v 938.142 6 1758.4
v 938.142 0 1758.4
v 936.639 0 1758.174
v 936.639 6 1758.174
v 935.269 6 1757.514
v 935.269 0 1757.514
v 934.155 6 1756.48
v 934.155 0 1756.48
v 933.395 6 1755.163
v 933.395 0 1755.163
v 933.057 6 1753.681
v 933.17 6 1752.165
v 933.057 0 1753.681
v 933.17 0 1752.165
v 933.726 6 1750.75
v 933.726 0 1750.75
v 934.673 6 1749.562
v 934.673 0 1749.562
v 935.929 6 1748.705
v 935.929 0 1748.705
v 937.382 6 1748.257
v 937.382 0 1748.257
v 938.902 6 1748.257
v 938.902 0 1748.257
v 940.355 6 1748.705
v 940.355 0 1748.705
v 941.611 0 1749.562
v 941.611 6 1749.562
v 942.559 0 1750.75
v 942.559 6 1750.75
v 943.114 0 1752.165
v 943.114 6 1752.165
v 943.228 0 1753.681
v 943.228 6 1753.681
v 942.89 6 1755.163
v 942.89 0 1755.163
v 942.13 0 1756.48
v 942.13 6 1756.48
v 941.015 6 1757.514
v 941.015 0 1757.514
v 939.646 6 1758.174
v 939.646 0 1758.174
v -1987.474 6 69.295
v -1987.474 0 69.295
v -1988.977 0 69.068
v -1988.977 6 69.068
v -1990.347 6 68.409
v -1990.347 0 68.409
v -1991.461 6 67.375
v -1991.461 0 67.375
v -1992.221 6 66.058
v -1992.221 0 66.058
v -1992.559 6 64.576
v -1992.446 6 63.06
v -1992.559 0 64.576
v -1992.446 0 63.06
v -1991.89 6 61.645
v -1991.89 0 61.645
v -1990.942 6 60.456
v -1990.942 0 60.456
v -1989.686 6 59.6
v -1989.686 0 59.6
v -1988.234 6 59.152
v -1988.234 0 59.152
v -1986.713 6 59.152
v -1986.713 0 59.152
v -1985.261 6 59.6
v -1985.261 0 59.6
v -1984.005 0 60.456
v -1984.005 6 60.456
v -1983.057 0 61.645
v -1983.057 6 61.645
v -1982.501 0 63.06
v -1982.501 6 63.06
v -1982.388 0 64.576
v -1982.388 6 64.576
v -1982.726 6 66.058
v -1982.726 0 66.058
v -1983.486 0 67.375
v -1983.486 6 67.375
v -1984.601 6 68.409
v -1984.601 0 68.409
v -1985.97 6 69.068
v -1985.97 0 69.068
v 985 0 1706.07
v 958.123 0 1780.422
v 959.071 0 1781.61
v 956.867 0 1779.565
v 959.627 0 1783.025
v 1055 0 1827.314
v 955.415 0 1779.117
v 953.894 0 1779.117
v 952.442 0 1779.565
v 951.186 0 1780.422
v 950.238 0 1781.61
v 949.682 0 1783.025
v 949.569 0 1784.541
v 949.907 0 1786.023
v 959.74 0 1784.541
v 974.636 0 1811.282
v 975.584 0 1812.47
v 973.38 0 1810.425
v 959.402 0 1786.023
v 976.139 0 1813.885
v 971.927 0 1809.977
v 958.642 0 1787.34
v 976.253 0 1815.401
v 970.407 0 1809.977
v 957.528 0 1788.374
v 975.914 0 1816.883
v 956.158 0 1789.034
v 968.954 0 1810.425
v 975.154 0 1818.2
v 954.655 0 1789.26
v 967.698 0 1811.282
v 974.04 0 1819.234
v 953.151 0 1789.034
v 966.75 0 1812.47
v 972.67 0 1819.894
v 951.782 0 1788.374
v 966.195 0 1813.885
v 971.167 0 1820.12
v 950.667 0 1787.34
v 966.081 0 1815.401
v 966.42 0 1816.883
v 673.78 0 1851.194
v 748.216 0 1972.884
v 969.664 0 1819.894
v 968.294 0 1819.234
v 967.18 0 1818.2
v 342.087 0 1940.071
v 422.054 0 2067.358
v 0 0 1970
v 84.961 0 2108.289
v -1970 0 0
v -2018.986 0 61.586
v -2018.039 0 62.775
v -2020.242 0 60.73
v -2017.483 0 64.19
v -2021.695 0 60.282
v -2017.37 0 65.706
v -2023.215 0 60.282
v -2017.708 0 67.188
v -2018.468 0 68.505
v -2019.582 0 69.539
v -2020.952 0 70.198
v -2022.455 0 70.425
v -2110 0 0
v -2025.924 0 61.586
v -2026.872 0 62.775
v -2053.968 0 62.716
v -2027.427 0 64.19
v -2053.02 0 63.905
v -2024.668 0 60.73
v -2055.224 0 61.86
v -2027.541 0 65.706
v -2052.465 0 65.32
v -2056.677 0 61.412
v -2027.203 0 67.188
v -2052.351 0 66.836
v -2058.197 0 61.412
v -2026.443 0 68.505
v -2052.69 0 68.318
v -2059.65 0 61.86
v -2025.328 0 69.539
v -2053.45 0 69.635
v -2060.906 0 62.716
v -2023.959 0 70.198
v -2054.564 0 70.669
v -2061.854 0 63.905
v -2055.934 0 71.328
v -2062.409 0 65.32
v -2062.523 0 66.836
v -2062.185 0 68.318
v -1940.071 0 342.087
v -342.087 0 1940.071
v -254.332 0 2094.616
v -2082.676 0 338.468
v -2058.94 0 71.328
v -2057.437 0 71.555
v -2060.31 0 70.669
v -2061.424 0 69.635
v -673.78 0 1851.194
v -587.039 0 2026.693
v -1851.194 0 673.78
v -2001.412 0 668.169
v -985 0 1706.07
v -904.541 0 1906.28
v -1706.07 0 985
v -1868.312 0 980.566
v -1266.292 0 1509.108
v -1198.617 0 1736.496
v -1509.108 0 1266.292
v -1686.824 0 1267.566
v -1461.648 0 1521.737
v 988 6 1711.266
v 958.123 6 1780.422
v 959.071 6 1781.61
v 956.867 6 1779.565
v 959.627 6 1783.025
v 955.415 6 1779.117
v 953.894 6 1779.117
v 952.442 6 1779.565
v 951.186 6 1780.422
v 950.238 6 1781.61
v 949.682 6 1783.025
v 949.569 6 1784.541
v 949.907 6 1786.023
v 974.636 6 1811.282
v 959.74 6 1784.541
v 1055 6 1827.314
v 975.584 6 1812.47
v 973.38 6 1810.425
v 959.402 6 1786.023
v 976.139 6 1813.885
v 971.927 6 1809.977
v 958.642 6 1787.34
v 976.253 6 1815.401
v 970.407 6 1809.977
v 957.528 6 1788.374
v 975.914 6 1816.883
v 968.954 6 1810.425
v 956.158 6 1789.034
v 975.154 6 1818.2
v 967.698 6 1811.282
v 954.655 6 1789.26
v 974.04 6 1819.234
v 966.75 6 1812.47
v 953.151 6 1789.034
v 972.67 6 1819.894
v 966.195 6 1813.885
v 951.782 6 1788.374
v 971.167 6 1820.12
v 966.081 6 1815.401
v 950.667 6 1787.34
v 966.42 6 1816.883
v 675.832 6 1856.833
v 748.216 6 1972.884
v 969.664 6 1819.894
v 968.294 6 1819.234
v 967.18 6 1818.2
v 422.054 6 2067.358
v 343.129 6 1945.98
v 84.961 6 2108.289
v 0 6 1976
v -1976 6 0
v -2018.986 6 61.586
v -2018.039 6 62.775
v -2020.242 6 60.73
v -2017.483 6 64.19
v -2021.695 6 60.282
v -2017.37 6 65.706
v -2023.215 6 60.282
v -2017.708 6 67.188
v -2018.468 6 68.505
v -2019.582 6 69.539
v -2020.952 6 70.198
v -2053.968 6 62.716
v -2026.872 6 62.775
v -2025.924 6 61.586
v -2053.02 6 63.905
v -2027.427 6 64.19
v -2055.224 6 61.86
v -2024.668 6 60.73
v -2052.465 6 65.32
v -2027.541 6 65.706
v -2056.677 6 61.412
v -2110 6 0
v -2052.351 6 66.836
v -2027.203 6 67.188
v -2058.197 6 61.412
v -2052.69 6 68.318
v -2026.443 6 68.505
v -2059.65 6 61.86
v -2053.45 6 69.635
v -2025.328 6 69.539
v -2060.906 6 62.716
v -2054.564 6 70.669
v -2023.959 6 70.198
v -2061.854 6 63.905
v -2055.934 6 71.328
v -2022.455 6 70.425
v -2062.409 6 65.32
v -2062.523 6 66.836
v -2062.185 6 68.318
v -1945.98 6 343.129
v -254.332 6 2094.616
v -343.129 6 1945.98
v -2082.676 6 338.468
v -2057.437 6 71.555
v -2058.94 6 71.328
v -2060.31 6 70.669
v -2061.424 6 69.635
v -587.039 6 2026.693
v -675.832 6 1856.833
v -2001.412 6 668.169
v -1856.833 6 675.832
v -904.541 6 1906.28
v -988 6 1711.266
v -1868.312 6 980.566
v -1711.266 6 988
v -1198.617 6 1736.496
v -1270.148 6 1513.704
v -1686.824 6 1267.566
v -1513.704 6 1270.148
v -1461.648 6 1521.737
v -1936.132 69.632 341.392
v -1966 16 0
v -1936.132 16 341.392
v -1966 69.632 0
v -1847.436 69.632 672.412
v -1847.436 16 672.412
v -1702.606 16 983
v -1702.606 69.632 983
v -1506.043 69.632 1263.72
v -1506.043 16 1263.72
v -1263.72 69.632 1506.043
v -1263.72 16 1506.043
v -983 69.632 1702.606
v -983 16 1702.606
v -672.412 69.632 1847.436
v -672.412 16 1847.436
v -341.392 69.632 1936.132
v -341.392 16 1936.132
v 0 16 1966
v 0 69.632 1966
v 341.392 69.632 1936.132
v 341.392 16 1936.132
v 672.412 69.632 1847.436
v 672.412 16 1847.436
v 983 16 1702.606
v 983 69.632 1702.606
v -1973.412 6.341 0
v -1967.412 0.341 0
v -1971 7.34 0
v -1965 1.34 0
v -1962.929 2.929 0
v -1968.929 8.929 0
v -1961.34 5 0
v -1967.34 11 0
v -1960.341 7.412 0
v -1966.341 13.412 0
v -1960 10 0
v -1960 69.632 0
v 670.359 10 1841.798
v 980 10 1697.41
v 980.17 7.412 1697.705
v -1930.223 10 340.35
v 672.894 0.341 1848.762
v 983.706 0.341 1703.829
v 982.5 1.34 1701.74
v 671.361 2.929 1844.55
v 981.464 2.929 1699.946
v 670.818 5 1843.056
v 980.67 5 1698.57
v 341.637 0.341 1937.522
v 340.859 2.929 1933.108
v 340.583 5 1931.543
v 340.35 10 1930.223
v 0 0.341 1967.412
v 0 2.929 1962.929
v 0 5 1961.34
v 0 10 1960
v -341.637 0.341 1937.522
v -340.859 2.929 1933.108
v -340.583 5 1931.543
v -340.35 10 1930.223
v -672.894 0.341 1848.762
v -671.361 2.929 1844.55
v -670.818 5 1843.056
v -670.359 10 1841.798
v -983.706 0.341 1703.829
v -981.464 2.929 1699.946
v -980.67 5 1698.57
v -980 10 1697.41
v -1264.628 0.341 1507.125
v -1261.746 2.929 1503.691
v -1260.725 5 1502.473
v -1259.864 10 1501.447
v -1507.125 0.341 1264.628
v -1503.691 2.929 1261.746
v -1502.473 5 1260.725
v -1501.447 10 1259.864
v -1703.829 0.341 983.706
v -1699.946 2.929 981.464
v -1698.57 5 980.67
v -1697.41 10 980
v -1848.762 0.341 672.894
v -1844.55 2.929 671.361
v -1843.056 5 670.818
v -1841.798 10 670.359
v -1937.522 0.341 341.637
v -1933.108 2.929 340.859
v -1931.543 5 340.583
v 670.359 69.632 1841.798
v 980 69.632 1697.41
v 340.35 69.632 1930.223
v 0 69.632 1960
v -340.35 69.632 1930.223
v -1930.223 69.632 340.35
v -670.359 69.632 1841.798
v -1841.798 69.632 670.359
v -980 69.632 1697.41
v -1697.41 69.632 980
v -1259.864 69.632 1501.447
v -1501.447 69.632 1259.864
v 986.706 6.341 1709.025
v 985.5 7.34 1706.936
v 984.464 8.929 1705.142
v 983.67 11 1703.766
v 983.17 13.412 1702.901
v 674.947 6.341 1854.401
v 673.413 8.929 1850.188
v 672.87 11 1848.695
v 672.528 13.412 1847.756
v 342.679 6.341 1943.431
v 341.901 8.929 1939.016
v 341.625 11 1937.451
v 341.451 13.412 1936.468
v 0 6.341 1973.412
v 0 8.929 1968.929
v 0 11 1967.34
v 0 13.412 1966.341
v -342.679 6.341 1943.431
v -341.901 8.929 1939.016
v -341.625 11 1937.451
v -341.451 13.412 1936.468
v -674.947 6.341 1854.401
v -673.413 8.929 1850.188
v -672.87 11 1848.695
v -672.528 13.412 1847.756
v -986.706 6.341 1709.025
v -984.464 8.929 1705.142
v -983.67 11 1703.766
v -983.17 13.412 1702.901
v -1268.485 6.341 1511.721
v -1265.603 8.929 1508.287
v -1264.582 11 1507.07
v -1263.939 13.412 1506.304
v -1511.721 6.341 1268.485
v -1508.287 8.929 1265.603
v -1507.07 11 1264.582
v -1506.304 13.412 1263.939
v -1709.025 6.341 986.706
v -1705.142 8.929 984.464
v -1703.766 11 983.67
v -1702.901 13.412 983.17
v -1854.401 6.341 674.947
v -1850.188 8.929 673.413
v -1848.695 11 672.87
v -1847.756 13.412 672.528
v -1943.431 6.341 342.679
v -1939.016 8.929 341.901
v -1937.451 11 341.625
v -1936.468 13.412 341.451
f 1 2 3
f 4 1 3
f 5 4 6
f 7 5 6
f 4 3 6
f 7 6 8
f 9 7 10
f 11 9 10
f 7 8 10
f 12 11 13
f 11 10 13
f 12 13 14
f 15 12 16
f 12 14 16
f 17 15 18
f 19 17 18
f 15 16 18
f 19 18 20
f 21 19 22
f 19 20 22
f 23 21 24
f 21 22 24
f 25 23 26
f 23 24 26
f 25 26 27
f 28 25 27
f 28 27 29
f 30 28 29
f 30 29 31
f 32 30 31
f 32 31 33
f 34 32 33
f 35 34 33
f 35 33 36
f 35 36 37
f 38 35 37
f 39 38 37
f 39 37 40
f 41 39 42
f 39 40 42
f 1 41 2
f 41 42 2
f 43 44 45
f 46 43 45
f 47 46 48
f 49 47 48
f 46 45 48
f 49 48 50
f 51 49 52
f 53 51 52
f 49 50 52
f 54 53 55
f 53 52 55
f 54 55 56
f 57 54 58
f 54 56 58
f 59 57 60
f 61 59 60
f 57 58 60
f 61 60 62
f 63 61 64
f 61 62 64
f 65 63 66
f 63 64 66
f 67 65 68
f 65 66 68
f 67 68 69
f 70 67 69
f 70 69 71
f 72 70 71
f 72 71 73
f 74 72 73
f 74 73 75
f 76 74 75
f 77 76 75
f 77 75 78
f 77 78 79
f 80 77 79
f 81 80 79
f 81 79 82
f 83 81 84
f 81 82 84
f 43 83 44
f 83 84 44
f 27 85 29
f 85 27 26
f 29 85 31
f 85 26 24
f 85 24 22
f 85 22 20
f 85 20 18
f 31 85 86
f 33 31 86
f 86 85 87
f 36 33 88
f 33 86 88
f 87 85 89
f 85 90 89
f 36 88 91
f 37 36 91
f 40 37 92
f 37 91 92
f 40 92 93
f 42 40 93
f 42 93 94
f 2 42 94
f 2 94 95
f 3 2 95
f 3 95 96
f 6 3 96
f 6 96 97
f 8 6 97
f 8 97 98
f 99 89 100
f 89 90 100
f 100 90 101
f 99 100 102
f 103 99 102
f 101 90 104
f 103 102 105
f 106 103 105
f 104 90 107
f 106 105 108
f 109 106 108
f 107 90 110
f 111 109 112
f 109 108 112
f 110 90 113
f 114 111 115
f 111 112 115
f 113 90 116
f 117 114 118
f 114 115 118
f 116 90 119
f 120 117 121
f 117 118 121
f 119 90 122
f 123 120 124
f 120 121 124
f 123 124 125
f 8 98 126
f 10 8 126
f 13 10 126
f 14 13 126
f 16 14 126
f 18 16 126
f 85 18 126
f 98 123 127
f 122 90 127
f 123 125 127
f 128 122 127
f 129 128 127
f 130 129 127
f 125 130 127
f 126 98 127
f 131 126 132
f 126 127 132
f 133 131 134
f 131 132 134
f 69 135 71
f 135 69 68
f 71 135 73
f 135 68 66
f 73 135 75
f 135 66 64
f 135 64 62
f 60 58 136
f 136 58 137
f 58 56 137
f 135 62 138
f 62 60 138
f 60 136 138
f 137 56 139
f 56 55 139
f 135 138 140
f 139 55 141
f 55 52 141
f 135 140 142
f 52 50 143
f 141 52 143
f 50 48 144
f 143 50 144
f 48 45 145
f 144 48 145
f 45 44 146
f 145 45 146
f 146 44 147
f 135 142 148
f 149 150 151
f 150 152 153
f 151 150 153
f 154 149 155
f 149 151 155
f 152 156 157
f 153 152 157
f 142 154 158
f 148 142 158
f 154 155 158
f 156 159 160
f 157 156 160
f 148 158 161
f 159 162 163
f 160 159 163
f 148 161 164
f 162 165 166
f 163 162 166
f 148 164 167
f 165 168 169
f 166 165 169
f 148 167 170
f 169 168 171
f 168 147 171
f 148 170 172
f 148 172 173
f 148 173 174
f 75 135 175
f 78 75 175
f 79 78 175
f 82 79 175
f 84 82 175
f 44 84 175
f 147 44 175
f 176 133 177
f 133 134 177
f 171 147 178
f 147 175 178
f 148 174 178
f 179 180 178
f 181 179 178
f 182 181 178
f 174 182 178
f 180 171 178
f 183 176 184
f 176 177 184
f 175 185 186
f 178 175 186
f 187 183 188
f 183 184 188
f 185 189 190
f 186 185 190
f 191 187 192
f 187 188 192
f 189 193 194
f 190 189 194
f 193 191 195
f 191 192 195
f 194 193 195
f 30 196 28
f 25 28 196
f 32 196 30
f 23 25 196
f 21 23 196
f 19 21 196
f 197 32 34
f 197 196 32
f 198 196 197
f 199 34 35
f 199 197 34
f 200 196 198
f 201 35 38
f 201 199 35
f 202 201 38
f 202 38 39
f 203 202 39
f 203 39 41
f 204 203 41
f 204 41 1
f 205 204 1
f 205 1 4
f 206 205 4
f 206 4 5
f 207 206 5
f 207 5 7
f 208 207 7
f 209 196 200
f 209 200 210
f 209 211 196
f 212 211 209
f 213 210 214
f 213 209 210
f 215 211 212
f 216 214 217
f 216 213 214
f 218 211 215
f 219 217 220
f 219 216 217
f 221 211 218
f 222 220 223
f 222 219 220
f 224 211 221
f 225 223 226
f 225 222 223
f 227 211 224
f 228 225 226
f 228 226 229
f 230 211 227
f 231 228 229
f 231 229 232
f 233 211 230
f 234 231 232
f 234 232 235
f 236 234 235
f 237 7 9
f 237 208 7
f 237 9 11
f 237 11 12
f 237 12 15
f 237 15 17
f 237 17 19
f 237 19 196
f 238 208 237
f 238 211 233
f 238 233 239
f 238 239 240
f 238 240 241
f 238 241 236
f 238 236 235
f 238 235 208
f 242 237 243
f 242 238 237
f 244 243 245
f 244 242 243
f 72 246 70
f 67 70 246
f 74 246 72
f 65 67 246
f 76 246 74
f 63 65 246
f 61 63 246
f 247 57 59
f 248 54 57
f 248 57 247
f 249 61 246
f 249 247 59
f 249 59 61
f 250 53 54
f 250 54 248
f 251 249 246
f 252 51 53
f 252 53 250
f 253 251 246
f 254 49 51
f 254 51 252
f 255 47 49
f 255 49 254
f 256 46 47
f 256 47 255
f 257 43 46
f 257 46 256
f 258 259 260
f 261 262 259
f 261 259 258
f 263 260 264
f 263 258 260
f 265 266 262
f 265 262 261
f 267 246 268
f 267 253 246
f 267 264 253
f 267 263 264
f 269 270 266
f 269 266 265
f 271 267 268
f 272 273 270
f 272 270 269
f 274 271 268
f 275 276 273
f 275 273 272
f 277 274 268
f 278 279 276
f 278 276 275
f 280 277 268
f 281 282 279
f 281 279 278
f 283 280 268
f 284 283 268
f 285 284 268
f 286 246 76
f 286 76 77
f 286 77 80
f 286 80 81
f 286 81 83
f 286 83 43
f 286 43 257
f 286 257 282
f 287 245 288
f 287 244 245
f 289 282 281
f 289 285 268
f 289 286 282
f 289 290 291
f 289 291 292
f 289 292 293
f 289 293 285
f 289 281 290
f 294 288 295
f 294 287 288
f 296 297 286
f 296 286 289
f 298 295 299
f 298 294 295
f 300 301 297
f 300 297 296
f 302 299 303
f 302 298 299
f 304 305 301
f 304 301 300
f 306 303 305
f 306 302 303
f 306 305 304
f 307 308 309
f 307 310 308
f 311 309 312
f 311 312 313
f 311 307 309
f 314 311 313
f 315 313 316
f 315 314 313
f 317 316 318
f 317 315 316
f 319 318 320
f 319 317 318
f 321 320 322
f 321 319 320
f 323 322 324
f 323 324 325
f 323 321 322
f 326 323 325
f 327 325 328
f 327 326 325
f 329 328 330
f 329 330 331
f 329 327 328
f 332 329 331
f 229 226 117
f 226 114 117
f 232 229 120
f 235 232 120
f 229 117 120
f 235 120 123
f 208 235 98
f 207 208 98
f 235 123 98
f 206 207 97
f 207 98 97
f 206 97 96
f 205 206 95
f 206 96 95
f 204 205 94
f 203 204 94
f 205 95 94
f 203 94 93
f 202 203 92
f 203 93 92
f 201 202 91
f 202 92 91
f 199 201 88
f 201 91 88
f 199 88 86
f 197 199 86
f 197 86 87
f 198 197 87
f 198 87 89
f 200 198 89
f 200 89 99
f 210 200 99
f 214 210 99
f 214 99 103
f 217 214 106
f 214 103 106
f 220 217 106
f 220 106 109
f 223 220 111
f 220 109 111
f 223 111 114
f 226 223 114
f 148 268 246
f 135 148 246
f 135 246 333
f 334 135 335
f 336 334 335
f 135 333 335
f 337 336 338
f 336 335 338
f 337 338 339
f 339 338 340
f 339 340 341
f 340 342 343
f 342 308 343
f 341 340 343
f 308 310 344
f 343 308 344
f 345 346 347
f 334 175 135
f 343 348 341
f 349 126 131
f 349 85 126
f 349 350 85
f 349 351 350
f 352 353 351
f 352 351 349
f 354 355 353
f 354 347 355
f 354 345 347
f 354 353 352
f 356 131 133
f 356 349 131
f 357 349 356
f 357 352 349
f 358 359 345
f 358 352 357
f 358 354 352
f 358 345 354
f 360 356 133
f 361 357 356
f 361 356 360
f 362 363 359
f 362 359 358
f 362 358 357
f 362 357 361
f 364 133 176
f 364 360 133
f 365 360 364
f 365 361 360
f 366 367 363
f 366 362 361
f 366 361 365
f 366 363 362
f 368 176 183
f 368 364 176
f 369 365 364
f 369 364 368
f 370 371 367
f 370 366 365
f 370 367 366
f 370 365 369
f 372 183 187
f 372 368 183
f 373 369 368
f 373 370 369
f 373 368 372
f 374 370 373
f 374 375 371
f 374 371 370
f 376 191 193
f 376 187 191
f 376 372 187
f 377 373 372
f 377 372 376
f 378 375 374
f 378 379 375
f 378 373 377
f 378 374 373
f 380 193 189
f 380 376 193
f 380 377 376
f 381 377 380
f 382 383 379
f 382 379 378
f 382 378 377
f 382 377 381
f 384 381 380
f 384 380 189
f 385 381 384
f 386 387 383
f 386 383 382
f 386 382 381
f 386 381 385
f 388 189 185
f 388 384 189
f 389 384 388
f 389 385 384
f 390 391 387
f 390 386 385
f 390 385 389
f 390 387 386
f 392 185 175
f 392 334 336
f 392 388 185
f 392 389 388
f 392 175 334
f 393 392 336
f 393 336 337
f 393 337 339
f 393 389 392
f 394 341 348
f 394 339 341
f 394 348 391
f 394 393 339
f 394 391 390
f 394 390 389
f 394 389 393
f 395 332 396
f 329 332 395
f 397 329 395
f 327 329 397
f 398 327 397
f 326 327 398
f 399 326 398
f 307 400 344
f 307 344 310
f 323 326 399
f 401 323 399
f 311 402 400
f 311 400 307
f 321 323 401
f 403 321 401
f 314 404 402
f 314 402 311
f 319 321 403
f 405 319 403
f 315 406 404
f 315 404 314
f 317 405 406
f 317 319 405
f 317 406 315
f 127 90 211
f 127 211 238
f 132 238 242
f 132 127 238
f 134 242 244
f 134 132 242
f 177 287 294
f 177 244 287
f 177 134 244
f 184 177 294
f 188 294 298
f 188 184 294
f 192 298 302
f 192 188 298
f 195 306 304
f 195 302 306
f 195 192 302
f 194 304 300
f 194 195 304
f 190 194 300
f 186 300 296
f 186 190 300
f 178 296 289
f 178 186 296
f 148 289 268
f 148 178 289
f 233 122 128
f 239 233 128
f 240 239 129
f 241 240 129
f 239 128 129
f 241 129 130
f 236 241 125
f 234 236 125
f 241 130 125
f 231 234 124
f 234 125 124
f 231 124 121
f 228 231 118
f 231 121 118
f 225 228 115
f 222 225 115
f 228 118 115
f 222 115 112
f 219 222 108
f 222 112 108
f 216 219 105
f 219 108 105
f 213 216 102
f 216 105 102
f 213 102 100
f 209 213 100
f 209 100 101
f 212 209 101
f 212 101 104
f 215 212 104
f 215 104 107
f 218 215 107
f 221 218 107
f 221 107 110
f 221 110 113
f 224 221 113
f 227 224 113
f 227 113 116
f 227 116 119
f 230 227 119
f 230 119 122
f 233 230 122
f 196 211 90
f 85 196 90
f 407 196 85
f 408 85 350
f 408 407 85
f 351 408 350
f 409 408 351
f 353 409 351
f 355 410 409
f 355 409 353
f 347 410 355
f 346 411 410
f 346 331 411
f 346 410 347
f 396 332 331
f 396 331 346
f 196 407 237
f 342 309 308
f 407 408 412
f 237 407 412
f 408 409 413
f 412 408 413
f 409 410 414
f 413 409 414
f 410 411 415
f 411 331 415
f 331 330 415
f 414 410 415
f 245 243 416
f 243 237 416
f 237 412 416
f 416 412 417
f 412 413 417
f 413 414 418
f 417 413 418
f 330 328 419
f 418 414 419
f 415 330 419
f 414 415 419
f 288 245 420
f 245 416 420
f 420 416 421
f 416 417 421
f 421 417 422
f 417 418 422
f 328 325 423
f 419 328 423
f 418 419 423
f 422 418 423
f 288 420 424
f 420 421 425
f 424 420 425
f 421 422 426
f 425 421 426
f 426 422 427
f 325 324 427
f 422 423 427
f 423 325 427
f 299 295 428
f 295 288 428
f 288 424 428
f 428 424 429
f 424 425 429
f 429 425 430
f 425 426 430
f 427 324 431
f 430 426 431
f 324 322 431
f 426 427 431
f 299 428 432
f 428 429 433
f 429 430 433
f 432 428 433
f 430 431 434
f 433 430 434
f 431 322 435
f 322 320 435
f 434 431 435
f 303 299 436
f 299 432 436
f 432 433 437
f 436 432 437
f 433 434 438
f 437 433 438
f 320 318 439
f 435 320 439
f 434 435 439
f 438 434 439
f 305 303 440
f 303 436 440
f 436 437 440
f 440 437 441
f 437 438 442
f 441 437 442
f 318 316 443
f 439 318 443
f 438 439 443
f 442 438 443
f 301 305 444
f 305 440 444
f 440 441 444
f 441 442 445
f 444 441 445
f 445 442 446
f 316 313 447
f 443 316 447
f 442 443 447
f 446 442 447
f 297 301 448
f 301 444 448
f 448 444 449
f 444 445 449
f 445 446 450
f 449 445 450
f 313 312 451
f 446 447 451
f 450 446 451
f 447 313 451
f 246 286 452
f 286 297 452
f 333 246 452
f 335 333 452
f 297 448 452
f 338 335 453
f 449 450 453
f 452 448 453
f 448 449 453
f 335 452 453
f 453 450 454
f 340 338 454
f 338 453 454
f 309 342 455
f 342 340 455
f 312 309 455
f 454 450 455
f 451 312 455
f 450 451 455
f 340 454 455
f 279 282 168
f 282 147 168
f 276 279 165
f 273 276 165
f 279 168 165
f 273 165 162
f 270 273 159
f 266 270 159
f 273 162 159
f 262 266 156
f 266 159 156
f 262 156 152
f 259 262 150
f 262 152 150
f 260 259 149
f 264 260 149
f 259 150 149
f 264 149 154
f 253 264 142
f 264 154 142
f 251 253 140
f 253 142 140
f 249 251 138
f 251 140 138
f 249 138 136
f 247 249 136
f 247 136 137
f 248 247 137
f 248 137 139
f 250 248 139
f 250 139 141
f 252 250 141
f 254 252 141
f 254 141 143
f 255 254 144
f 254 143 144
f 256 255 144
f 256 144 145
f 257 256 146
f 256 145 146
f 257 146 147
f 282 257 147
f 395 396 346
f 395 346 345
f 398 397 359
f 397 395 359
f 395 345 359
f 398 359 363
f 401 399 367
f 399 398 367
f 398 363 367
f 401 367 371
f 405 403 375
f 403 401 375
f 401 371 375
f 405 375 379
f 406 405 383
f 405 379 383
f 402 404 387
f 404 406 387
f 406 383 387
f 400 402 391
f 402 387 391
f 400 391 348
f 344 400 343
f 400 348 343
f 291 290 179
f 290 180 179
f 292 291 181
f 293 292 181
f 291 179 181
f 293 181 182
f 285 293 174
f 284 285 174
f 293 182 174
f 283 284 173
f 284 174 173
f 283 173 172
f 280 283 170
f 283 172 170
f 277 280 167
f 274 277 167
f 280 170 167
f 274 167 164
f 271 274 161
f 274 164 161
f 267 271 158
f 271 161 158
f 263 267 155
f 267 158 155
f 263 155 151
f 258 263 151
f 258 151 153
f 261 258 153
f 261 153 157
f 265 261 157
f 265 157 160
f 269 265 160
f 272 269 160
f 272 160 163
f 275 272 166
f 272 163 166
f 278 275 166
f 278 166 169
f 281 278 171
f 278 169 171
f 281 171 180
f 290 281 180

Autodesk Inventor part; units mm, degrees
ref_plane "YZ Plane" through (0, 0, 0) normal (1, 0, 0) x (0, 1, 0)
ref_plane "XZ Plane" through (0, 0, 0) normal (0, 1, 0) x (-1, 0, 0)
ref_plane "XY Plane" through (0, 0, 0) normal (0, 0, 1) x (1, 0, 0)
sketch "Sketch1" plane through (0, 0, 0) normal (0, 0, 1) x (1, 0, 0)
  line L0 (-1970, 0) -> (-2110, 0)
  line L1 (0, 0) -> (0, 620.2794)
  line L2 (-2110, 0) -> (-1960, 0)
  line L3 (-1960, 0) -> (-1960, 6)
  line L4 (-1976, 6) -> (-2110, 6)
  line L5 (-2110, 6) -> (-2110, 0)
  line L6 (-1960, 0) -> (-2037.7729, 0)
  line L7 (-1966, 16) -> (-1966, 69.6323)
  line L8 (-1966, 69.6323) -> (-1960, 69.6323)
  line L9 (-1960, 69.6323) -> (-1960, 10)
  arc A0 (-1976, 6) -> (-1966, 16) centre (-1976, 16) ccw
  arc A1 (-1970, 0) -> (-1960, 10) centre (-1970, 10) ccw
  dimension "d1" = 150
  dimension "d2" = 6
  dimension "d3" = 6
  dimension "d4" = 100
  dimension "d5" = 10
  dimension "d6" = 10
  dimension "d39" = 1960
revolve "Revolution1" add sketch "Sketch1" angle 120 about axis through (0, 0, 0) along (0, 1, 0)
sketch "Sketch2" plane through (-2110, 6, 0) normal (0, 1, 0) x (1, 0, 0)
  line L0 (3098, -1711.2662) -> (3165, -1827.3136) projected
  arc A0 (3105.459, -1860.4197) -> (3165, -1827.3136) centre (2110, 0) ccw
  line L1 (2110, 0) -> (3105.459, -1860.4197) construction
  line L2 (2110, 0) -> (3165, -1827.3136) construction
  arc A1 (0, 0) -> (3165, -1827.3136) centre (2110, 0) ccw projected
  line L3 (3105.459, -1860.4197) -> (3023.8502, -1707.9006)
  line L4 (3064.6546, -1784.1601) -> (3048.1423, -1753.3001)
  line L5 (3064.6546, -1784.1601) -> (3081.167, -1815.0202)
  line L6 (2110, 0) -> (1055, -1827.3136)
  line L7 (2110, 0) -> (4220, 0) construction
  line L8 (87.5447, -65.3249) -> (122.5264, -64.195)
  line L9 (87.5447, -65.3249) -> (52.5629, -66.4548)
  point P0 (1.0998, -68.1171)
  point P1 (1.0998, -68.1171)
  dimension "d8" = 1.85
  dimension "d9" = 35
  dimension "d10" = 35
  dimension "d11" = 120
hole "Hole1" at (954.6546, 6, 1784.1601) at (938.1423, 6, 1753.3001) at (971.167, 6, 1815.0202) direction (0, -1, 0) diameter 10.2 end through all
thread "Thread1" size "M10x1.5" class "6H" standard "ANSI Metric M Profile" full length
thread "Thread2" size "M10x1.5" class "6H" standard "ANSI Metric M Profile" full length
thread "Thread3" size "M11x1.5" class "6H" standard "ANSI Metric M Profile" full length
hole "Hole2" at (-2022.4553, 6, 65.3249) at (-2057.4371, 6, 66.4548) at (-1987.4736, 6, 64.195) direction (0, -1, 0) diameter 10.2 end through all
thread "Thread4" size "M10x1.5" class "6H" standard "ANSI Metric M Profile" full length
thread "Thread5" size "M10x1.5" class "6H" standard "ANSI Metric M Profile" full length
thread "Thread6" size "M10x1.5" class "6H" standard "ANSI Metric M Profile" full length
properties part number "Support Ring Section, L Section" material "Aluminum 6061"
